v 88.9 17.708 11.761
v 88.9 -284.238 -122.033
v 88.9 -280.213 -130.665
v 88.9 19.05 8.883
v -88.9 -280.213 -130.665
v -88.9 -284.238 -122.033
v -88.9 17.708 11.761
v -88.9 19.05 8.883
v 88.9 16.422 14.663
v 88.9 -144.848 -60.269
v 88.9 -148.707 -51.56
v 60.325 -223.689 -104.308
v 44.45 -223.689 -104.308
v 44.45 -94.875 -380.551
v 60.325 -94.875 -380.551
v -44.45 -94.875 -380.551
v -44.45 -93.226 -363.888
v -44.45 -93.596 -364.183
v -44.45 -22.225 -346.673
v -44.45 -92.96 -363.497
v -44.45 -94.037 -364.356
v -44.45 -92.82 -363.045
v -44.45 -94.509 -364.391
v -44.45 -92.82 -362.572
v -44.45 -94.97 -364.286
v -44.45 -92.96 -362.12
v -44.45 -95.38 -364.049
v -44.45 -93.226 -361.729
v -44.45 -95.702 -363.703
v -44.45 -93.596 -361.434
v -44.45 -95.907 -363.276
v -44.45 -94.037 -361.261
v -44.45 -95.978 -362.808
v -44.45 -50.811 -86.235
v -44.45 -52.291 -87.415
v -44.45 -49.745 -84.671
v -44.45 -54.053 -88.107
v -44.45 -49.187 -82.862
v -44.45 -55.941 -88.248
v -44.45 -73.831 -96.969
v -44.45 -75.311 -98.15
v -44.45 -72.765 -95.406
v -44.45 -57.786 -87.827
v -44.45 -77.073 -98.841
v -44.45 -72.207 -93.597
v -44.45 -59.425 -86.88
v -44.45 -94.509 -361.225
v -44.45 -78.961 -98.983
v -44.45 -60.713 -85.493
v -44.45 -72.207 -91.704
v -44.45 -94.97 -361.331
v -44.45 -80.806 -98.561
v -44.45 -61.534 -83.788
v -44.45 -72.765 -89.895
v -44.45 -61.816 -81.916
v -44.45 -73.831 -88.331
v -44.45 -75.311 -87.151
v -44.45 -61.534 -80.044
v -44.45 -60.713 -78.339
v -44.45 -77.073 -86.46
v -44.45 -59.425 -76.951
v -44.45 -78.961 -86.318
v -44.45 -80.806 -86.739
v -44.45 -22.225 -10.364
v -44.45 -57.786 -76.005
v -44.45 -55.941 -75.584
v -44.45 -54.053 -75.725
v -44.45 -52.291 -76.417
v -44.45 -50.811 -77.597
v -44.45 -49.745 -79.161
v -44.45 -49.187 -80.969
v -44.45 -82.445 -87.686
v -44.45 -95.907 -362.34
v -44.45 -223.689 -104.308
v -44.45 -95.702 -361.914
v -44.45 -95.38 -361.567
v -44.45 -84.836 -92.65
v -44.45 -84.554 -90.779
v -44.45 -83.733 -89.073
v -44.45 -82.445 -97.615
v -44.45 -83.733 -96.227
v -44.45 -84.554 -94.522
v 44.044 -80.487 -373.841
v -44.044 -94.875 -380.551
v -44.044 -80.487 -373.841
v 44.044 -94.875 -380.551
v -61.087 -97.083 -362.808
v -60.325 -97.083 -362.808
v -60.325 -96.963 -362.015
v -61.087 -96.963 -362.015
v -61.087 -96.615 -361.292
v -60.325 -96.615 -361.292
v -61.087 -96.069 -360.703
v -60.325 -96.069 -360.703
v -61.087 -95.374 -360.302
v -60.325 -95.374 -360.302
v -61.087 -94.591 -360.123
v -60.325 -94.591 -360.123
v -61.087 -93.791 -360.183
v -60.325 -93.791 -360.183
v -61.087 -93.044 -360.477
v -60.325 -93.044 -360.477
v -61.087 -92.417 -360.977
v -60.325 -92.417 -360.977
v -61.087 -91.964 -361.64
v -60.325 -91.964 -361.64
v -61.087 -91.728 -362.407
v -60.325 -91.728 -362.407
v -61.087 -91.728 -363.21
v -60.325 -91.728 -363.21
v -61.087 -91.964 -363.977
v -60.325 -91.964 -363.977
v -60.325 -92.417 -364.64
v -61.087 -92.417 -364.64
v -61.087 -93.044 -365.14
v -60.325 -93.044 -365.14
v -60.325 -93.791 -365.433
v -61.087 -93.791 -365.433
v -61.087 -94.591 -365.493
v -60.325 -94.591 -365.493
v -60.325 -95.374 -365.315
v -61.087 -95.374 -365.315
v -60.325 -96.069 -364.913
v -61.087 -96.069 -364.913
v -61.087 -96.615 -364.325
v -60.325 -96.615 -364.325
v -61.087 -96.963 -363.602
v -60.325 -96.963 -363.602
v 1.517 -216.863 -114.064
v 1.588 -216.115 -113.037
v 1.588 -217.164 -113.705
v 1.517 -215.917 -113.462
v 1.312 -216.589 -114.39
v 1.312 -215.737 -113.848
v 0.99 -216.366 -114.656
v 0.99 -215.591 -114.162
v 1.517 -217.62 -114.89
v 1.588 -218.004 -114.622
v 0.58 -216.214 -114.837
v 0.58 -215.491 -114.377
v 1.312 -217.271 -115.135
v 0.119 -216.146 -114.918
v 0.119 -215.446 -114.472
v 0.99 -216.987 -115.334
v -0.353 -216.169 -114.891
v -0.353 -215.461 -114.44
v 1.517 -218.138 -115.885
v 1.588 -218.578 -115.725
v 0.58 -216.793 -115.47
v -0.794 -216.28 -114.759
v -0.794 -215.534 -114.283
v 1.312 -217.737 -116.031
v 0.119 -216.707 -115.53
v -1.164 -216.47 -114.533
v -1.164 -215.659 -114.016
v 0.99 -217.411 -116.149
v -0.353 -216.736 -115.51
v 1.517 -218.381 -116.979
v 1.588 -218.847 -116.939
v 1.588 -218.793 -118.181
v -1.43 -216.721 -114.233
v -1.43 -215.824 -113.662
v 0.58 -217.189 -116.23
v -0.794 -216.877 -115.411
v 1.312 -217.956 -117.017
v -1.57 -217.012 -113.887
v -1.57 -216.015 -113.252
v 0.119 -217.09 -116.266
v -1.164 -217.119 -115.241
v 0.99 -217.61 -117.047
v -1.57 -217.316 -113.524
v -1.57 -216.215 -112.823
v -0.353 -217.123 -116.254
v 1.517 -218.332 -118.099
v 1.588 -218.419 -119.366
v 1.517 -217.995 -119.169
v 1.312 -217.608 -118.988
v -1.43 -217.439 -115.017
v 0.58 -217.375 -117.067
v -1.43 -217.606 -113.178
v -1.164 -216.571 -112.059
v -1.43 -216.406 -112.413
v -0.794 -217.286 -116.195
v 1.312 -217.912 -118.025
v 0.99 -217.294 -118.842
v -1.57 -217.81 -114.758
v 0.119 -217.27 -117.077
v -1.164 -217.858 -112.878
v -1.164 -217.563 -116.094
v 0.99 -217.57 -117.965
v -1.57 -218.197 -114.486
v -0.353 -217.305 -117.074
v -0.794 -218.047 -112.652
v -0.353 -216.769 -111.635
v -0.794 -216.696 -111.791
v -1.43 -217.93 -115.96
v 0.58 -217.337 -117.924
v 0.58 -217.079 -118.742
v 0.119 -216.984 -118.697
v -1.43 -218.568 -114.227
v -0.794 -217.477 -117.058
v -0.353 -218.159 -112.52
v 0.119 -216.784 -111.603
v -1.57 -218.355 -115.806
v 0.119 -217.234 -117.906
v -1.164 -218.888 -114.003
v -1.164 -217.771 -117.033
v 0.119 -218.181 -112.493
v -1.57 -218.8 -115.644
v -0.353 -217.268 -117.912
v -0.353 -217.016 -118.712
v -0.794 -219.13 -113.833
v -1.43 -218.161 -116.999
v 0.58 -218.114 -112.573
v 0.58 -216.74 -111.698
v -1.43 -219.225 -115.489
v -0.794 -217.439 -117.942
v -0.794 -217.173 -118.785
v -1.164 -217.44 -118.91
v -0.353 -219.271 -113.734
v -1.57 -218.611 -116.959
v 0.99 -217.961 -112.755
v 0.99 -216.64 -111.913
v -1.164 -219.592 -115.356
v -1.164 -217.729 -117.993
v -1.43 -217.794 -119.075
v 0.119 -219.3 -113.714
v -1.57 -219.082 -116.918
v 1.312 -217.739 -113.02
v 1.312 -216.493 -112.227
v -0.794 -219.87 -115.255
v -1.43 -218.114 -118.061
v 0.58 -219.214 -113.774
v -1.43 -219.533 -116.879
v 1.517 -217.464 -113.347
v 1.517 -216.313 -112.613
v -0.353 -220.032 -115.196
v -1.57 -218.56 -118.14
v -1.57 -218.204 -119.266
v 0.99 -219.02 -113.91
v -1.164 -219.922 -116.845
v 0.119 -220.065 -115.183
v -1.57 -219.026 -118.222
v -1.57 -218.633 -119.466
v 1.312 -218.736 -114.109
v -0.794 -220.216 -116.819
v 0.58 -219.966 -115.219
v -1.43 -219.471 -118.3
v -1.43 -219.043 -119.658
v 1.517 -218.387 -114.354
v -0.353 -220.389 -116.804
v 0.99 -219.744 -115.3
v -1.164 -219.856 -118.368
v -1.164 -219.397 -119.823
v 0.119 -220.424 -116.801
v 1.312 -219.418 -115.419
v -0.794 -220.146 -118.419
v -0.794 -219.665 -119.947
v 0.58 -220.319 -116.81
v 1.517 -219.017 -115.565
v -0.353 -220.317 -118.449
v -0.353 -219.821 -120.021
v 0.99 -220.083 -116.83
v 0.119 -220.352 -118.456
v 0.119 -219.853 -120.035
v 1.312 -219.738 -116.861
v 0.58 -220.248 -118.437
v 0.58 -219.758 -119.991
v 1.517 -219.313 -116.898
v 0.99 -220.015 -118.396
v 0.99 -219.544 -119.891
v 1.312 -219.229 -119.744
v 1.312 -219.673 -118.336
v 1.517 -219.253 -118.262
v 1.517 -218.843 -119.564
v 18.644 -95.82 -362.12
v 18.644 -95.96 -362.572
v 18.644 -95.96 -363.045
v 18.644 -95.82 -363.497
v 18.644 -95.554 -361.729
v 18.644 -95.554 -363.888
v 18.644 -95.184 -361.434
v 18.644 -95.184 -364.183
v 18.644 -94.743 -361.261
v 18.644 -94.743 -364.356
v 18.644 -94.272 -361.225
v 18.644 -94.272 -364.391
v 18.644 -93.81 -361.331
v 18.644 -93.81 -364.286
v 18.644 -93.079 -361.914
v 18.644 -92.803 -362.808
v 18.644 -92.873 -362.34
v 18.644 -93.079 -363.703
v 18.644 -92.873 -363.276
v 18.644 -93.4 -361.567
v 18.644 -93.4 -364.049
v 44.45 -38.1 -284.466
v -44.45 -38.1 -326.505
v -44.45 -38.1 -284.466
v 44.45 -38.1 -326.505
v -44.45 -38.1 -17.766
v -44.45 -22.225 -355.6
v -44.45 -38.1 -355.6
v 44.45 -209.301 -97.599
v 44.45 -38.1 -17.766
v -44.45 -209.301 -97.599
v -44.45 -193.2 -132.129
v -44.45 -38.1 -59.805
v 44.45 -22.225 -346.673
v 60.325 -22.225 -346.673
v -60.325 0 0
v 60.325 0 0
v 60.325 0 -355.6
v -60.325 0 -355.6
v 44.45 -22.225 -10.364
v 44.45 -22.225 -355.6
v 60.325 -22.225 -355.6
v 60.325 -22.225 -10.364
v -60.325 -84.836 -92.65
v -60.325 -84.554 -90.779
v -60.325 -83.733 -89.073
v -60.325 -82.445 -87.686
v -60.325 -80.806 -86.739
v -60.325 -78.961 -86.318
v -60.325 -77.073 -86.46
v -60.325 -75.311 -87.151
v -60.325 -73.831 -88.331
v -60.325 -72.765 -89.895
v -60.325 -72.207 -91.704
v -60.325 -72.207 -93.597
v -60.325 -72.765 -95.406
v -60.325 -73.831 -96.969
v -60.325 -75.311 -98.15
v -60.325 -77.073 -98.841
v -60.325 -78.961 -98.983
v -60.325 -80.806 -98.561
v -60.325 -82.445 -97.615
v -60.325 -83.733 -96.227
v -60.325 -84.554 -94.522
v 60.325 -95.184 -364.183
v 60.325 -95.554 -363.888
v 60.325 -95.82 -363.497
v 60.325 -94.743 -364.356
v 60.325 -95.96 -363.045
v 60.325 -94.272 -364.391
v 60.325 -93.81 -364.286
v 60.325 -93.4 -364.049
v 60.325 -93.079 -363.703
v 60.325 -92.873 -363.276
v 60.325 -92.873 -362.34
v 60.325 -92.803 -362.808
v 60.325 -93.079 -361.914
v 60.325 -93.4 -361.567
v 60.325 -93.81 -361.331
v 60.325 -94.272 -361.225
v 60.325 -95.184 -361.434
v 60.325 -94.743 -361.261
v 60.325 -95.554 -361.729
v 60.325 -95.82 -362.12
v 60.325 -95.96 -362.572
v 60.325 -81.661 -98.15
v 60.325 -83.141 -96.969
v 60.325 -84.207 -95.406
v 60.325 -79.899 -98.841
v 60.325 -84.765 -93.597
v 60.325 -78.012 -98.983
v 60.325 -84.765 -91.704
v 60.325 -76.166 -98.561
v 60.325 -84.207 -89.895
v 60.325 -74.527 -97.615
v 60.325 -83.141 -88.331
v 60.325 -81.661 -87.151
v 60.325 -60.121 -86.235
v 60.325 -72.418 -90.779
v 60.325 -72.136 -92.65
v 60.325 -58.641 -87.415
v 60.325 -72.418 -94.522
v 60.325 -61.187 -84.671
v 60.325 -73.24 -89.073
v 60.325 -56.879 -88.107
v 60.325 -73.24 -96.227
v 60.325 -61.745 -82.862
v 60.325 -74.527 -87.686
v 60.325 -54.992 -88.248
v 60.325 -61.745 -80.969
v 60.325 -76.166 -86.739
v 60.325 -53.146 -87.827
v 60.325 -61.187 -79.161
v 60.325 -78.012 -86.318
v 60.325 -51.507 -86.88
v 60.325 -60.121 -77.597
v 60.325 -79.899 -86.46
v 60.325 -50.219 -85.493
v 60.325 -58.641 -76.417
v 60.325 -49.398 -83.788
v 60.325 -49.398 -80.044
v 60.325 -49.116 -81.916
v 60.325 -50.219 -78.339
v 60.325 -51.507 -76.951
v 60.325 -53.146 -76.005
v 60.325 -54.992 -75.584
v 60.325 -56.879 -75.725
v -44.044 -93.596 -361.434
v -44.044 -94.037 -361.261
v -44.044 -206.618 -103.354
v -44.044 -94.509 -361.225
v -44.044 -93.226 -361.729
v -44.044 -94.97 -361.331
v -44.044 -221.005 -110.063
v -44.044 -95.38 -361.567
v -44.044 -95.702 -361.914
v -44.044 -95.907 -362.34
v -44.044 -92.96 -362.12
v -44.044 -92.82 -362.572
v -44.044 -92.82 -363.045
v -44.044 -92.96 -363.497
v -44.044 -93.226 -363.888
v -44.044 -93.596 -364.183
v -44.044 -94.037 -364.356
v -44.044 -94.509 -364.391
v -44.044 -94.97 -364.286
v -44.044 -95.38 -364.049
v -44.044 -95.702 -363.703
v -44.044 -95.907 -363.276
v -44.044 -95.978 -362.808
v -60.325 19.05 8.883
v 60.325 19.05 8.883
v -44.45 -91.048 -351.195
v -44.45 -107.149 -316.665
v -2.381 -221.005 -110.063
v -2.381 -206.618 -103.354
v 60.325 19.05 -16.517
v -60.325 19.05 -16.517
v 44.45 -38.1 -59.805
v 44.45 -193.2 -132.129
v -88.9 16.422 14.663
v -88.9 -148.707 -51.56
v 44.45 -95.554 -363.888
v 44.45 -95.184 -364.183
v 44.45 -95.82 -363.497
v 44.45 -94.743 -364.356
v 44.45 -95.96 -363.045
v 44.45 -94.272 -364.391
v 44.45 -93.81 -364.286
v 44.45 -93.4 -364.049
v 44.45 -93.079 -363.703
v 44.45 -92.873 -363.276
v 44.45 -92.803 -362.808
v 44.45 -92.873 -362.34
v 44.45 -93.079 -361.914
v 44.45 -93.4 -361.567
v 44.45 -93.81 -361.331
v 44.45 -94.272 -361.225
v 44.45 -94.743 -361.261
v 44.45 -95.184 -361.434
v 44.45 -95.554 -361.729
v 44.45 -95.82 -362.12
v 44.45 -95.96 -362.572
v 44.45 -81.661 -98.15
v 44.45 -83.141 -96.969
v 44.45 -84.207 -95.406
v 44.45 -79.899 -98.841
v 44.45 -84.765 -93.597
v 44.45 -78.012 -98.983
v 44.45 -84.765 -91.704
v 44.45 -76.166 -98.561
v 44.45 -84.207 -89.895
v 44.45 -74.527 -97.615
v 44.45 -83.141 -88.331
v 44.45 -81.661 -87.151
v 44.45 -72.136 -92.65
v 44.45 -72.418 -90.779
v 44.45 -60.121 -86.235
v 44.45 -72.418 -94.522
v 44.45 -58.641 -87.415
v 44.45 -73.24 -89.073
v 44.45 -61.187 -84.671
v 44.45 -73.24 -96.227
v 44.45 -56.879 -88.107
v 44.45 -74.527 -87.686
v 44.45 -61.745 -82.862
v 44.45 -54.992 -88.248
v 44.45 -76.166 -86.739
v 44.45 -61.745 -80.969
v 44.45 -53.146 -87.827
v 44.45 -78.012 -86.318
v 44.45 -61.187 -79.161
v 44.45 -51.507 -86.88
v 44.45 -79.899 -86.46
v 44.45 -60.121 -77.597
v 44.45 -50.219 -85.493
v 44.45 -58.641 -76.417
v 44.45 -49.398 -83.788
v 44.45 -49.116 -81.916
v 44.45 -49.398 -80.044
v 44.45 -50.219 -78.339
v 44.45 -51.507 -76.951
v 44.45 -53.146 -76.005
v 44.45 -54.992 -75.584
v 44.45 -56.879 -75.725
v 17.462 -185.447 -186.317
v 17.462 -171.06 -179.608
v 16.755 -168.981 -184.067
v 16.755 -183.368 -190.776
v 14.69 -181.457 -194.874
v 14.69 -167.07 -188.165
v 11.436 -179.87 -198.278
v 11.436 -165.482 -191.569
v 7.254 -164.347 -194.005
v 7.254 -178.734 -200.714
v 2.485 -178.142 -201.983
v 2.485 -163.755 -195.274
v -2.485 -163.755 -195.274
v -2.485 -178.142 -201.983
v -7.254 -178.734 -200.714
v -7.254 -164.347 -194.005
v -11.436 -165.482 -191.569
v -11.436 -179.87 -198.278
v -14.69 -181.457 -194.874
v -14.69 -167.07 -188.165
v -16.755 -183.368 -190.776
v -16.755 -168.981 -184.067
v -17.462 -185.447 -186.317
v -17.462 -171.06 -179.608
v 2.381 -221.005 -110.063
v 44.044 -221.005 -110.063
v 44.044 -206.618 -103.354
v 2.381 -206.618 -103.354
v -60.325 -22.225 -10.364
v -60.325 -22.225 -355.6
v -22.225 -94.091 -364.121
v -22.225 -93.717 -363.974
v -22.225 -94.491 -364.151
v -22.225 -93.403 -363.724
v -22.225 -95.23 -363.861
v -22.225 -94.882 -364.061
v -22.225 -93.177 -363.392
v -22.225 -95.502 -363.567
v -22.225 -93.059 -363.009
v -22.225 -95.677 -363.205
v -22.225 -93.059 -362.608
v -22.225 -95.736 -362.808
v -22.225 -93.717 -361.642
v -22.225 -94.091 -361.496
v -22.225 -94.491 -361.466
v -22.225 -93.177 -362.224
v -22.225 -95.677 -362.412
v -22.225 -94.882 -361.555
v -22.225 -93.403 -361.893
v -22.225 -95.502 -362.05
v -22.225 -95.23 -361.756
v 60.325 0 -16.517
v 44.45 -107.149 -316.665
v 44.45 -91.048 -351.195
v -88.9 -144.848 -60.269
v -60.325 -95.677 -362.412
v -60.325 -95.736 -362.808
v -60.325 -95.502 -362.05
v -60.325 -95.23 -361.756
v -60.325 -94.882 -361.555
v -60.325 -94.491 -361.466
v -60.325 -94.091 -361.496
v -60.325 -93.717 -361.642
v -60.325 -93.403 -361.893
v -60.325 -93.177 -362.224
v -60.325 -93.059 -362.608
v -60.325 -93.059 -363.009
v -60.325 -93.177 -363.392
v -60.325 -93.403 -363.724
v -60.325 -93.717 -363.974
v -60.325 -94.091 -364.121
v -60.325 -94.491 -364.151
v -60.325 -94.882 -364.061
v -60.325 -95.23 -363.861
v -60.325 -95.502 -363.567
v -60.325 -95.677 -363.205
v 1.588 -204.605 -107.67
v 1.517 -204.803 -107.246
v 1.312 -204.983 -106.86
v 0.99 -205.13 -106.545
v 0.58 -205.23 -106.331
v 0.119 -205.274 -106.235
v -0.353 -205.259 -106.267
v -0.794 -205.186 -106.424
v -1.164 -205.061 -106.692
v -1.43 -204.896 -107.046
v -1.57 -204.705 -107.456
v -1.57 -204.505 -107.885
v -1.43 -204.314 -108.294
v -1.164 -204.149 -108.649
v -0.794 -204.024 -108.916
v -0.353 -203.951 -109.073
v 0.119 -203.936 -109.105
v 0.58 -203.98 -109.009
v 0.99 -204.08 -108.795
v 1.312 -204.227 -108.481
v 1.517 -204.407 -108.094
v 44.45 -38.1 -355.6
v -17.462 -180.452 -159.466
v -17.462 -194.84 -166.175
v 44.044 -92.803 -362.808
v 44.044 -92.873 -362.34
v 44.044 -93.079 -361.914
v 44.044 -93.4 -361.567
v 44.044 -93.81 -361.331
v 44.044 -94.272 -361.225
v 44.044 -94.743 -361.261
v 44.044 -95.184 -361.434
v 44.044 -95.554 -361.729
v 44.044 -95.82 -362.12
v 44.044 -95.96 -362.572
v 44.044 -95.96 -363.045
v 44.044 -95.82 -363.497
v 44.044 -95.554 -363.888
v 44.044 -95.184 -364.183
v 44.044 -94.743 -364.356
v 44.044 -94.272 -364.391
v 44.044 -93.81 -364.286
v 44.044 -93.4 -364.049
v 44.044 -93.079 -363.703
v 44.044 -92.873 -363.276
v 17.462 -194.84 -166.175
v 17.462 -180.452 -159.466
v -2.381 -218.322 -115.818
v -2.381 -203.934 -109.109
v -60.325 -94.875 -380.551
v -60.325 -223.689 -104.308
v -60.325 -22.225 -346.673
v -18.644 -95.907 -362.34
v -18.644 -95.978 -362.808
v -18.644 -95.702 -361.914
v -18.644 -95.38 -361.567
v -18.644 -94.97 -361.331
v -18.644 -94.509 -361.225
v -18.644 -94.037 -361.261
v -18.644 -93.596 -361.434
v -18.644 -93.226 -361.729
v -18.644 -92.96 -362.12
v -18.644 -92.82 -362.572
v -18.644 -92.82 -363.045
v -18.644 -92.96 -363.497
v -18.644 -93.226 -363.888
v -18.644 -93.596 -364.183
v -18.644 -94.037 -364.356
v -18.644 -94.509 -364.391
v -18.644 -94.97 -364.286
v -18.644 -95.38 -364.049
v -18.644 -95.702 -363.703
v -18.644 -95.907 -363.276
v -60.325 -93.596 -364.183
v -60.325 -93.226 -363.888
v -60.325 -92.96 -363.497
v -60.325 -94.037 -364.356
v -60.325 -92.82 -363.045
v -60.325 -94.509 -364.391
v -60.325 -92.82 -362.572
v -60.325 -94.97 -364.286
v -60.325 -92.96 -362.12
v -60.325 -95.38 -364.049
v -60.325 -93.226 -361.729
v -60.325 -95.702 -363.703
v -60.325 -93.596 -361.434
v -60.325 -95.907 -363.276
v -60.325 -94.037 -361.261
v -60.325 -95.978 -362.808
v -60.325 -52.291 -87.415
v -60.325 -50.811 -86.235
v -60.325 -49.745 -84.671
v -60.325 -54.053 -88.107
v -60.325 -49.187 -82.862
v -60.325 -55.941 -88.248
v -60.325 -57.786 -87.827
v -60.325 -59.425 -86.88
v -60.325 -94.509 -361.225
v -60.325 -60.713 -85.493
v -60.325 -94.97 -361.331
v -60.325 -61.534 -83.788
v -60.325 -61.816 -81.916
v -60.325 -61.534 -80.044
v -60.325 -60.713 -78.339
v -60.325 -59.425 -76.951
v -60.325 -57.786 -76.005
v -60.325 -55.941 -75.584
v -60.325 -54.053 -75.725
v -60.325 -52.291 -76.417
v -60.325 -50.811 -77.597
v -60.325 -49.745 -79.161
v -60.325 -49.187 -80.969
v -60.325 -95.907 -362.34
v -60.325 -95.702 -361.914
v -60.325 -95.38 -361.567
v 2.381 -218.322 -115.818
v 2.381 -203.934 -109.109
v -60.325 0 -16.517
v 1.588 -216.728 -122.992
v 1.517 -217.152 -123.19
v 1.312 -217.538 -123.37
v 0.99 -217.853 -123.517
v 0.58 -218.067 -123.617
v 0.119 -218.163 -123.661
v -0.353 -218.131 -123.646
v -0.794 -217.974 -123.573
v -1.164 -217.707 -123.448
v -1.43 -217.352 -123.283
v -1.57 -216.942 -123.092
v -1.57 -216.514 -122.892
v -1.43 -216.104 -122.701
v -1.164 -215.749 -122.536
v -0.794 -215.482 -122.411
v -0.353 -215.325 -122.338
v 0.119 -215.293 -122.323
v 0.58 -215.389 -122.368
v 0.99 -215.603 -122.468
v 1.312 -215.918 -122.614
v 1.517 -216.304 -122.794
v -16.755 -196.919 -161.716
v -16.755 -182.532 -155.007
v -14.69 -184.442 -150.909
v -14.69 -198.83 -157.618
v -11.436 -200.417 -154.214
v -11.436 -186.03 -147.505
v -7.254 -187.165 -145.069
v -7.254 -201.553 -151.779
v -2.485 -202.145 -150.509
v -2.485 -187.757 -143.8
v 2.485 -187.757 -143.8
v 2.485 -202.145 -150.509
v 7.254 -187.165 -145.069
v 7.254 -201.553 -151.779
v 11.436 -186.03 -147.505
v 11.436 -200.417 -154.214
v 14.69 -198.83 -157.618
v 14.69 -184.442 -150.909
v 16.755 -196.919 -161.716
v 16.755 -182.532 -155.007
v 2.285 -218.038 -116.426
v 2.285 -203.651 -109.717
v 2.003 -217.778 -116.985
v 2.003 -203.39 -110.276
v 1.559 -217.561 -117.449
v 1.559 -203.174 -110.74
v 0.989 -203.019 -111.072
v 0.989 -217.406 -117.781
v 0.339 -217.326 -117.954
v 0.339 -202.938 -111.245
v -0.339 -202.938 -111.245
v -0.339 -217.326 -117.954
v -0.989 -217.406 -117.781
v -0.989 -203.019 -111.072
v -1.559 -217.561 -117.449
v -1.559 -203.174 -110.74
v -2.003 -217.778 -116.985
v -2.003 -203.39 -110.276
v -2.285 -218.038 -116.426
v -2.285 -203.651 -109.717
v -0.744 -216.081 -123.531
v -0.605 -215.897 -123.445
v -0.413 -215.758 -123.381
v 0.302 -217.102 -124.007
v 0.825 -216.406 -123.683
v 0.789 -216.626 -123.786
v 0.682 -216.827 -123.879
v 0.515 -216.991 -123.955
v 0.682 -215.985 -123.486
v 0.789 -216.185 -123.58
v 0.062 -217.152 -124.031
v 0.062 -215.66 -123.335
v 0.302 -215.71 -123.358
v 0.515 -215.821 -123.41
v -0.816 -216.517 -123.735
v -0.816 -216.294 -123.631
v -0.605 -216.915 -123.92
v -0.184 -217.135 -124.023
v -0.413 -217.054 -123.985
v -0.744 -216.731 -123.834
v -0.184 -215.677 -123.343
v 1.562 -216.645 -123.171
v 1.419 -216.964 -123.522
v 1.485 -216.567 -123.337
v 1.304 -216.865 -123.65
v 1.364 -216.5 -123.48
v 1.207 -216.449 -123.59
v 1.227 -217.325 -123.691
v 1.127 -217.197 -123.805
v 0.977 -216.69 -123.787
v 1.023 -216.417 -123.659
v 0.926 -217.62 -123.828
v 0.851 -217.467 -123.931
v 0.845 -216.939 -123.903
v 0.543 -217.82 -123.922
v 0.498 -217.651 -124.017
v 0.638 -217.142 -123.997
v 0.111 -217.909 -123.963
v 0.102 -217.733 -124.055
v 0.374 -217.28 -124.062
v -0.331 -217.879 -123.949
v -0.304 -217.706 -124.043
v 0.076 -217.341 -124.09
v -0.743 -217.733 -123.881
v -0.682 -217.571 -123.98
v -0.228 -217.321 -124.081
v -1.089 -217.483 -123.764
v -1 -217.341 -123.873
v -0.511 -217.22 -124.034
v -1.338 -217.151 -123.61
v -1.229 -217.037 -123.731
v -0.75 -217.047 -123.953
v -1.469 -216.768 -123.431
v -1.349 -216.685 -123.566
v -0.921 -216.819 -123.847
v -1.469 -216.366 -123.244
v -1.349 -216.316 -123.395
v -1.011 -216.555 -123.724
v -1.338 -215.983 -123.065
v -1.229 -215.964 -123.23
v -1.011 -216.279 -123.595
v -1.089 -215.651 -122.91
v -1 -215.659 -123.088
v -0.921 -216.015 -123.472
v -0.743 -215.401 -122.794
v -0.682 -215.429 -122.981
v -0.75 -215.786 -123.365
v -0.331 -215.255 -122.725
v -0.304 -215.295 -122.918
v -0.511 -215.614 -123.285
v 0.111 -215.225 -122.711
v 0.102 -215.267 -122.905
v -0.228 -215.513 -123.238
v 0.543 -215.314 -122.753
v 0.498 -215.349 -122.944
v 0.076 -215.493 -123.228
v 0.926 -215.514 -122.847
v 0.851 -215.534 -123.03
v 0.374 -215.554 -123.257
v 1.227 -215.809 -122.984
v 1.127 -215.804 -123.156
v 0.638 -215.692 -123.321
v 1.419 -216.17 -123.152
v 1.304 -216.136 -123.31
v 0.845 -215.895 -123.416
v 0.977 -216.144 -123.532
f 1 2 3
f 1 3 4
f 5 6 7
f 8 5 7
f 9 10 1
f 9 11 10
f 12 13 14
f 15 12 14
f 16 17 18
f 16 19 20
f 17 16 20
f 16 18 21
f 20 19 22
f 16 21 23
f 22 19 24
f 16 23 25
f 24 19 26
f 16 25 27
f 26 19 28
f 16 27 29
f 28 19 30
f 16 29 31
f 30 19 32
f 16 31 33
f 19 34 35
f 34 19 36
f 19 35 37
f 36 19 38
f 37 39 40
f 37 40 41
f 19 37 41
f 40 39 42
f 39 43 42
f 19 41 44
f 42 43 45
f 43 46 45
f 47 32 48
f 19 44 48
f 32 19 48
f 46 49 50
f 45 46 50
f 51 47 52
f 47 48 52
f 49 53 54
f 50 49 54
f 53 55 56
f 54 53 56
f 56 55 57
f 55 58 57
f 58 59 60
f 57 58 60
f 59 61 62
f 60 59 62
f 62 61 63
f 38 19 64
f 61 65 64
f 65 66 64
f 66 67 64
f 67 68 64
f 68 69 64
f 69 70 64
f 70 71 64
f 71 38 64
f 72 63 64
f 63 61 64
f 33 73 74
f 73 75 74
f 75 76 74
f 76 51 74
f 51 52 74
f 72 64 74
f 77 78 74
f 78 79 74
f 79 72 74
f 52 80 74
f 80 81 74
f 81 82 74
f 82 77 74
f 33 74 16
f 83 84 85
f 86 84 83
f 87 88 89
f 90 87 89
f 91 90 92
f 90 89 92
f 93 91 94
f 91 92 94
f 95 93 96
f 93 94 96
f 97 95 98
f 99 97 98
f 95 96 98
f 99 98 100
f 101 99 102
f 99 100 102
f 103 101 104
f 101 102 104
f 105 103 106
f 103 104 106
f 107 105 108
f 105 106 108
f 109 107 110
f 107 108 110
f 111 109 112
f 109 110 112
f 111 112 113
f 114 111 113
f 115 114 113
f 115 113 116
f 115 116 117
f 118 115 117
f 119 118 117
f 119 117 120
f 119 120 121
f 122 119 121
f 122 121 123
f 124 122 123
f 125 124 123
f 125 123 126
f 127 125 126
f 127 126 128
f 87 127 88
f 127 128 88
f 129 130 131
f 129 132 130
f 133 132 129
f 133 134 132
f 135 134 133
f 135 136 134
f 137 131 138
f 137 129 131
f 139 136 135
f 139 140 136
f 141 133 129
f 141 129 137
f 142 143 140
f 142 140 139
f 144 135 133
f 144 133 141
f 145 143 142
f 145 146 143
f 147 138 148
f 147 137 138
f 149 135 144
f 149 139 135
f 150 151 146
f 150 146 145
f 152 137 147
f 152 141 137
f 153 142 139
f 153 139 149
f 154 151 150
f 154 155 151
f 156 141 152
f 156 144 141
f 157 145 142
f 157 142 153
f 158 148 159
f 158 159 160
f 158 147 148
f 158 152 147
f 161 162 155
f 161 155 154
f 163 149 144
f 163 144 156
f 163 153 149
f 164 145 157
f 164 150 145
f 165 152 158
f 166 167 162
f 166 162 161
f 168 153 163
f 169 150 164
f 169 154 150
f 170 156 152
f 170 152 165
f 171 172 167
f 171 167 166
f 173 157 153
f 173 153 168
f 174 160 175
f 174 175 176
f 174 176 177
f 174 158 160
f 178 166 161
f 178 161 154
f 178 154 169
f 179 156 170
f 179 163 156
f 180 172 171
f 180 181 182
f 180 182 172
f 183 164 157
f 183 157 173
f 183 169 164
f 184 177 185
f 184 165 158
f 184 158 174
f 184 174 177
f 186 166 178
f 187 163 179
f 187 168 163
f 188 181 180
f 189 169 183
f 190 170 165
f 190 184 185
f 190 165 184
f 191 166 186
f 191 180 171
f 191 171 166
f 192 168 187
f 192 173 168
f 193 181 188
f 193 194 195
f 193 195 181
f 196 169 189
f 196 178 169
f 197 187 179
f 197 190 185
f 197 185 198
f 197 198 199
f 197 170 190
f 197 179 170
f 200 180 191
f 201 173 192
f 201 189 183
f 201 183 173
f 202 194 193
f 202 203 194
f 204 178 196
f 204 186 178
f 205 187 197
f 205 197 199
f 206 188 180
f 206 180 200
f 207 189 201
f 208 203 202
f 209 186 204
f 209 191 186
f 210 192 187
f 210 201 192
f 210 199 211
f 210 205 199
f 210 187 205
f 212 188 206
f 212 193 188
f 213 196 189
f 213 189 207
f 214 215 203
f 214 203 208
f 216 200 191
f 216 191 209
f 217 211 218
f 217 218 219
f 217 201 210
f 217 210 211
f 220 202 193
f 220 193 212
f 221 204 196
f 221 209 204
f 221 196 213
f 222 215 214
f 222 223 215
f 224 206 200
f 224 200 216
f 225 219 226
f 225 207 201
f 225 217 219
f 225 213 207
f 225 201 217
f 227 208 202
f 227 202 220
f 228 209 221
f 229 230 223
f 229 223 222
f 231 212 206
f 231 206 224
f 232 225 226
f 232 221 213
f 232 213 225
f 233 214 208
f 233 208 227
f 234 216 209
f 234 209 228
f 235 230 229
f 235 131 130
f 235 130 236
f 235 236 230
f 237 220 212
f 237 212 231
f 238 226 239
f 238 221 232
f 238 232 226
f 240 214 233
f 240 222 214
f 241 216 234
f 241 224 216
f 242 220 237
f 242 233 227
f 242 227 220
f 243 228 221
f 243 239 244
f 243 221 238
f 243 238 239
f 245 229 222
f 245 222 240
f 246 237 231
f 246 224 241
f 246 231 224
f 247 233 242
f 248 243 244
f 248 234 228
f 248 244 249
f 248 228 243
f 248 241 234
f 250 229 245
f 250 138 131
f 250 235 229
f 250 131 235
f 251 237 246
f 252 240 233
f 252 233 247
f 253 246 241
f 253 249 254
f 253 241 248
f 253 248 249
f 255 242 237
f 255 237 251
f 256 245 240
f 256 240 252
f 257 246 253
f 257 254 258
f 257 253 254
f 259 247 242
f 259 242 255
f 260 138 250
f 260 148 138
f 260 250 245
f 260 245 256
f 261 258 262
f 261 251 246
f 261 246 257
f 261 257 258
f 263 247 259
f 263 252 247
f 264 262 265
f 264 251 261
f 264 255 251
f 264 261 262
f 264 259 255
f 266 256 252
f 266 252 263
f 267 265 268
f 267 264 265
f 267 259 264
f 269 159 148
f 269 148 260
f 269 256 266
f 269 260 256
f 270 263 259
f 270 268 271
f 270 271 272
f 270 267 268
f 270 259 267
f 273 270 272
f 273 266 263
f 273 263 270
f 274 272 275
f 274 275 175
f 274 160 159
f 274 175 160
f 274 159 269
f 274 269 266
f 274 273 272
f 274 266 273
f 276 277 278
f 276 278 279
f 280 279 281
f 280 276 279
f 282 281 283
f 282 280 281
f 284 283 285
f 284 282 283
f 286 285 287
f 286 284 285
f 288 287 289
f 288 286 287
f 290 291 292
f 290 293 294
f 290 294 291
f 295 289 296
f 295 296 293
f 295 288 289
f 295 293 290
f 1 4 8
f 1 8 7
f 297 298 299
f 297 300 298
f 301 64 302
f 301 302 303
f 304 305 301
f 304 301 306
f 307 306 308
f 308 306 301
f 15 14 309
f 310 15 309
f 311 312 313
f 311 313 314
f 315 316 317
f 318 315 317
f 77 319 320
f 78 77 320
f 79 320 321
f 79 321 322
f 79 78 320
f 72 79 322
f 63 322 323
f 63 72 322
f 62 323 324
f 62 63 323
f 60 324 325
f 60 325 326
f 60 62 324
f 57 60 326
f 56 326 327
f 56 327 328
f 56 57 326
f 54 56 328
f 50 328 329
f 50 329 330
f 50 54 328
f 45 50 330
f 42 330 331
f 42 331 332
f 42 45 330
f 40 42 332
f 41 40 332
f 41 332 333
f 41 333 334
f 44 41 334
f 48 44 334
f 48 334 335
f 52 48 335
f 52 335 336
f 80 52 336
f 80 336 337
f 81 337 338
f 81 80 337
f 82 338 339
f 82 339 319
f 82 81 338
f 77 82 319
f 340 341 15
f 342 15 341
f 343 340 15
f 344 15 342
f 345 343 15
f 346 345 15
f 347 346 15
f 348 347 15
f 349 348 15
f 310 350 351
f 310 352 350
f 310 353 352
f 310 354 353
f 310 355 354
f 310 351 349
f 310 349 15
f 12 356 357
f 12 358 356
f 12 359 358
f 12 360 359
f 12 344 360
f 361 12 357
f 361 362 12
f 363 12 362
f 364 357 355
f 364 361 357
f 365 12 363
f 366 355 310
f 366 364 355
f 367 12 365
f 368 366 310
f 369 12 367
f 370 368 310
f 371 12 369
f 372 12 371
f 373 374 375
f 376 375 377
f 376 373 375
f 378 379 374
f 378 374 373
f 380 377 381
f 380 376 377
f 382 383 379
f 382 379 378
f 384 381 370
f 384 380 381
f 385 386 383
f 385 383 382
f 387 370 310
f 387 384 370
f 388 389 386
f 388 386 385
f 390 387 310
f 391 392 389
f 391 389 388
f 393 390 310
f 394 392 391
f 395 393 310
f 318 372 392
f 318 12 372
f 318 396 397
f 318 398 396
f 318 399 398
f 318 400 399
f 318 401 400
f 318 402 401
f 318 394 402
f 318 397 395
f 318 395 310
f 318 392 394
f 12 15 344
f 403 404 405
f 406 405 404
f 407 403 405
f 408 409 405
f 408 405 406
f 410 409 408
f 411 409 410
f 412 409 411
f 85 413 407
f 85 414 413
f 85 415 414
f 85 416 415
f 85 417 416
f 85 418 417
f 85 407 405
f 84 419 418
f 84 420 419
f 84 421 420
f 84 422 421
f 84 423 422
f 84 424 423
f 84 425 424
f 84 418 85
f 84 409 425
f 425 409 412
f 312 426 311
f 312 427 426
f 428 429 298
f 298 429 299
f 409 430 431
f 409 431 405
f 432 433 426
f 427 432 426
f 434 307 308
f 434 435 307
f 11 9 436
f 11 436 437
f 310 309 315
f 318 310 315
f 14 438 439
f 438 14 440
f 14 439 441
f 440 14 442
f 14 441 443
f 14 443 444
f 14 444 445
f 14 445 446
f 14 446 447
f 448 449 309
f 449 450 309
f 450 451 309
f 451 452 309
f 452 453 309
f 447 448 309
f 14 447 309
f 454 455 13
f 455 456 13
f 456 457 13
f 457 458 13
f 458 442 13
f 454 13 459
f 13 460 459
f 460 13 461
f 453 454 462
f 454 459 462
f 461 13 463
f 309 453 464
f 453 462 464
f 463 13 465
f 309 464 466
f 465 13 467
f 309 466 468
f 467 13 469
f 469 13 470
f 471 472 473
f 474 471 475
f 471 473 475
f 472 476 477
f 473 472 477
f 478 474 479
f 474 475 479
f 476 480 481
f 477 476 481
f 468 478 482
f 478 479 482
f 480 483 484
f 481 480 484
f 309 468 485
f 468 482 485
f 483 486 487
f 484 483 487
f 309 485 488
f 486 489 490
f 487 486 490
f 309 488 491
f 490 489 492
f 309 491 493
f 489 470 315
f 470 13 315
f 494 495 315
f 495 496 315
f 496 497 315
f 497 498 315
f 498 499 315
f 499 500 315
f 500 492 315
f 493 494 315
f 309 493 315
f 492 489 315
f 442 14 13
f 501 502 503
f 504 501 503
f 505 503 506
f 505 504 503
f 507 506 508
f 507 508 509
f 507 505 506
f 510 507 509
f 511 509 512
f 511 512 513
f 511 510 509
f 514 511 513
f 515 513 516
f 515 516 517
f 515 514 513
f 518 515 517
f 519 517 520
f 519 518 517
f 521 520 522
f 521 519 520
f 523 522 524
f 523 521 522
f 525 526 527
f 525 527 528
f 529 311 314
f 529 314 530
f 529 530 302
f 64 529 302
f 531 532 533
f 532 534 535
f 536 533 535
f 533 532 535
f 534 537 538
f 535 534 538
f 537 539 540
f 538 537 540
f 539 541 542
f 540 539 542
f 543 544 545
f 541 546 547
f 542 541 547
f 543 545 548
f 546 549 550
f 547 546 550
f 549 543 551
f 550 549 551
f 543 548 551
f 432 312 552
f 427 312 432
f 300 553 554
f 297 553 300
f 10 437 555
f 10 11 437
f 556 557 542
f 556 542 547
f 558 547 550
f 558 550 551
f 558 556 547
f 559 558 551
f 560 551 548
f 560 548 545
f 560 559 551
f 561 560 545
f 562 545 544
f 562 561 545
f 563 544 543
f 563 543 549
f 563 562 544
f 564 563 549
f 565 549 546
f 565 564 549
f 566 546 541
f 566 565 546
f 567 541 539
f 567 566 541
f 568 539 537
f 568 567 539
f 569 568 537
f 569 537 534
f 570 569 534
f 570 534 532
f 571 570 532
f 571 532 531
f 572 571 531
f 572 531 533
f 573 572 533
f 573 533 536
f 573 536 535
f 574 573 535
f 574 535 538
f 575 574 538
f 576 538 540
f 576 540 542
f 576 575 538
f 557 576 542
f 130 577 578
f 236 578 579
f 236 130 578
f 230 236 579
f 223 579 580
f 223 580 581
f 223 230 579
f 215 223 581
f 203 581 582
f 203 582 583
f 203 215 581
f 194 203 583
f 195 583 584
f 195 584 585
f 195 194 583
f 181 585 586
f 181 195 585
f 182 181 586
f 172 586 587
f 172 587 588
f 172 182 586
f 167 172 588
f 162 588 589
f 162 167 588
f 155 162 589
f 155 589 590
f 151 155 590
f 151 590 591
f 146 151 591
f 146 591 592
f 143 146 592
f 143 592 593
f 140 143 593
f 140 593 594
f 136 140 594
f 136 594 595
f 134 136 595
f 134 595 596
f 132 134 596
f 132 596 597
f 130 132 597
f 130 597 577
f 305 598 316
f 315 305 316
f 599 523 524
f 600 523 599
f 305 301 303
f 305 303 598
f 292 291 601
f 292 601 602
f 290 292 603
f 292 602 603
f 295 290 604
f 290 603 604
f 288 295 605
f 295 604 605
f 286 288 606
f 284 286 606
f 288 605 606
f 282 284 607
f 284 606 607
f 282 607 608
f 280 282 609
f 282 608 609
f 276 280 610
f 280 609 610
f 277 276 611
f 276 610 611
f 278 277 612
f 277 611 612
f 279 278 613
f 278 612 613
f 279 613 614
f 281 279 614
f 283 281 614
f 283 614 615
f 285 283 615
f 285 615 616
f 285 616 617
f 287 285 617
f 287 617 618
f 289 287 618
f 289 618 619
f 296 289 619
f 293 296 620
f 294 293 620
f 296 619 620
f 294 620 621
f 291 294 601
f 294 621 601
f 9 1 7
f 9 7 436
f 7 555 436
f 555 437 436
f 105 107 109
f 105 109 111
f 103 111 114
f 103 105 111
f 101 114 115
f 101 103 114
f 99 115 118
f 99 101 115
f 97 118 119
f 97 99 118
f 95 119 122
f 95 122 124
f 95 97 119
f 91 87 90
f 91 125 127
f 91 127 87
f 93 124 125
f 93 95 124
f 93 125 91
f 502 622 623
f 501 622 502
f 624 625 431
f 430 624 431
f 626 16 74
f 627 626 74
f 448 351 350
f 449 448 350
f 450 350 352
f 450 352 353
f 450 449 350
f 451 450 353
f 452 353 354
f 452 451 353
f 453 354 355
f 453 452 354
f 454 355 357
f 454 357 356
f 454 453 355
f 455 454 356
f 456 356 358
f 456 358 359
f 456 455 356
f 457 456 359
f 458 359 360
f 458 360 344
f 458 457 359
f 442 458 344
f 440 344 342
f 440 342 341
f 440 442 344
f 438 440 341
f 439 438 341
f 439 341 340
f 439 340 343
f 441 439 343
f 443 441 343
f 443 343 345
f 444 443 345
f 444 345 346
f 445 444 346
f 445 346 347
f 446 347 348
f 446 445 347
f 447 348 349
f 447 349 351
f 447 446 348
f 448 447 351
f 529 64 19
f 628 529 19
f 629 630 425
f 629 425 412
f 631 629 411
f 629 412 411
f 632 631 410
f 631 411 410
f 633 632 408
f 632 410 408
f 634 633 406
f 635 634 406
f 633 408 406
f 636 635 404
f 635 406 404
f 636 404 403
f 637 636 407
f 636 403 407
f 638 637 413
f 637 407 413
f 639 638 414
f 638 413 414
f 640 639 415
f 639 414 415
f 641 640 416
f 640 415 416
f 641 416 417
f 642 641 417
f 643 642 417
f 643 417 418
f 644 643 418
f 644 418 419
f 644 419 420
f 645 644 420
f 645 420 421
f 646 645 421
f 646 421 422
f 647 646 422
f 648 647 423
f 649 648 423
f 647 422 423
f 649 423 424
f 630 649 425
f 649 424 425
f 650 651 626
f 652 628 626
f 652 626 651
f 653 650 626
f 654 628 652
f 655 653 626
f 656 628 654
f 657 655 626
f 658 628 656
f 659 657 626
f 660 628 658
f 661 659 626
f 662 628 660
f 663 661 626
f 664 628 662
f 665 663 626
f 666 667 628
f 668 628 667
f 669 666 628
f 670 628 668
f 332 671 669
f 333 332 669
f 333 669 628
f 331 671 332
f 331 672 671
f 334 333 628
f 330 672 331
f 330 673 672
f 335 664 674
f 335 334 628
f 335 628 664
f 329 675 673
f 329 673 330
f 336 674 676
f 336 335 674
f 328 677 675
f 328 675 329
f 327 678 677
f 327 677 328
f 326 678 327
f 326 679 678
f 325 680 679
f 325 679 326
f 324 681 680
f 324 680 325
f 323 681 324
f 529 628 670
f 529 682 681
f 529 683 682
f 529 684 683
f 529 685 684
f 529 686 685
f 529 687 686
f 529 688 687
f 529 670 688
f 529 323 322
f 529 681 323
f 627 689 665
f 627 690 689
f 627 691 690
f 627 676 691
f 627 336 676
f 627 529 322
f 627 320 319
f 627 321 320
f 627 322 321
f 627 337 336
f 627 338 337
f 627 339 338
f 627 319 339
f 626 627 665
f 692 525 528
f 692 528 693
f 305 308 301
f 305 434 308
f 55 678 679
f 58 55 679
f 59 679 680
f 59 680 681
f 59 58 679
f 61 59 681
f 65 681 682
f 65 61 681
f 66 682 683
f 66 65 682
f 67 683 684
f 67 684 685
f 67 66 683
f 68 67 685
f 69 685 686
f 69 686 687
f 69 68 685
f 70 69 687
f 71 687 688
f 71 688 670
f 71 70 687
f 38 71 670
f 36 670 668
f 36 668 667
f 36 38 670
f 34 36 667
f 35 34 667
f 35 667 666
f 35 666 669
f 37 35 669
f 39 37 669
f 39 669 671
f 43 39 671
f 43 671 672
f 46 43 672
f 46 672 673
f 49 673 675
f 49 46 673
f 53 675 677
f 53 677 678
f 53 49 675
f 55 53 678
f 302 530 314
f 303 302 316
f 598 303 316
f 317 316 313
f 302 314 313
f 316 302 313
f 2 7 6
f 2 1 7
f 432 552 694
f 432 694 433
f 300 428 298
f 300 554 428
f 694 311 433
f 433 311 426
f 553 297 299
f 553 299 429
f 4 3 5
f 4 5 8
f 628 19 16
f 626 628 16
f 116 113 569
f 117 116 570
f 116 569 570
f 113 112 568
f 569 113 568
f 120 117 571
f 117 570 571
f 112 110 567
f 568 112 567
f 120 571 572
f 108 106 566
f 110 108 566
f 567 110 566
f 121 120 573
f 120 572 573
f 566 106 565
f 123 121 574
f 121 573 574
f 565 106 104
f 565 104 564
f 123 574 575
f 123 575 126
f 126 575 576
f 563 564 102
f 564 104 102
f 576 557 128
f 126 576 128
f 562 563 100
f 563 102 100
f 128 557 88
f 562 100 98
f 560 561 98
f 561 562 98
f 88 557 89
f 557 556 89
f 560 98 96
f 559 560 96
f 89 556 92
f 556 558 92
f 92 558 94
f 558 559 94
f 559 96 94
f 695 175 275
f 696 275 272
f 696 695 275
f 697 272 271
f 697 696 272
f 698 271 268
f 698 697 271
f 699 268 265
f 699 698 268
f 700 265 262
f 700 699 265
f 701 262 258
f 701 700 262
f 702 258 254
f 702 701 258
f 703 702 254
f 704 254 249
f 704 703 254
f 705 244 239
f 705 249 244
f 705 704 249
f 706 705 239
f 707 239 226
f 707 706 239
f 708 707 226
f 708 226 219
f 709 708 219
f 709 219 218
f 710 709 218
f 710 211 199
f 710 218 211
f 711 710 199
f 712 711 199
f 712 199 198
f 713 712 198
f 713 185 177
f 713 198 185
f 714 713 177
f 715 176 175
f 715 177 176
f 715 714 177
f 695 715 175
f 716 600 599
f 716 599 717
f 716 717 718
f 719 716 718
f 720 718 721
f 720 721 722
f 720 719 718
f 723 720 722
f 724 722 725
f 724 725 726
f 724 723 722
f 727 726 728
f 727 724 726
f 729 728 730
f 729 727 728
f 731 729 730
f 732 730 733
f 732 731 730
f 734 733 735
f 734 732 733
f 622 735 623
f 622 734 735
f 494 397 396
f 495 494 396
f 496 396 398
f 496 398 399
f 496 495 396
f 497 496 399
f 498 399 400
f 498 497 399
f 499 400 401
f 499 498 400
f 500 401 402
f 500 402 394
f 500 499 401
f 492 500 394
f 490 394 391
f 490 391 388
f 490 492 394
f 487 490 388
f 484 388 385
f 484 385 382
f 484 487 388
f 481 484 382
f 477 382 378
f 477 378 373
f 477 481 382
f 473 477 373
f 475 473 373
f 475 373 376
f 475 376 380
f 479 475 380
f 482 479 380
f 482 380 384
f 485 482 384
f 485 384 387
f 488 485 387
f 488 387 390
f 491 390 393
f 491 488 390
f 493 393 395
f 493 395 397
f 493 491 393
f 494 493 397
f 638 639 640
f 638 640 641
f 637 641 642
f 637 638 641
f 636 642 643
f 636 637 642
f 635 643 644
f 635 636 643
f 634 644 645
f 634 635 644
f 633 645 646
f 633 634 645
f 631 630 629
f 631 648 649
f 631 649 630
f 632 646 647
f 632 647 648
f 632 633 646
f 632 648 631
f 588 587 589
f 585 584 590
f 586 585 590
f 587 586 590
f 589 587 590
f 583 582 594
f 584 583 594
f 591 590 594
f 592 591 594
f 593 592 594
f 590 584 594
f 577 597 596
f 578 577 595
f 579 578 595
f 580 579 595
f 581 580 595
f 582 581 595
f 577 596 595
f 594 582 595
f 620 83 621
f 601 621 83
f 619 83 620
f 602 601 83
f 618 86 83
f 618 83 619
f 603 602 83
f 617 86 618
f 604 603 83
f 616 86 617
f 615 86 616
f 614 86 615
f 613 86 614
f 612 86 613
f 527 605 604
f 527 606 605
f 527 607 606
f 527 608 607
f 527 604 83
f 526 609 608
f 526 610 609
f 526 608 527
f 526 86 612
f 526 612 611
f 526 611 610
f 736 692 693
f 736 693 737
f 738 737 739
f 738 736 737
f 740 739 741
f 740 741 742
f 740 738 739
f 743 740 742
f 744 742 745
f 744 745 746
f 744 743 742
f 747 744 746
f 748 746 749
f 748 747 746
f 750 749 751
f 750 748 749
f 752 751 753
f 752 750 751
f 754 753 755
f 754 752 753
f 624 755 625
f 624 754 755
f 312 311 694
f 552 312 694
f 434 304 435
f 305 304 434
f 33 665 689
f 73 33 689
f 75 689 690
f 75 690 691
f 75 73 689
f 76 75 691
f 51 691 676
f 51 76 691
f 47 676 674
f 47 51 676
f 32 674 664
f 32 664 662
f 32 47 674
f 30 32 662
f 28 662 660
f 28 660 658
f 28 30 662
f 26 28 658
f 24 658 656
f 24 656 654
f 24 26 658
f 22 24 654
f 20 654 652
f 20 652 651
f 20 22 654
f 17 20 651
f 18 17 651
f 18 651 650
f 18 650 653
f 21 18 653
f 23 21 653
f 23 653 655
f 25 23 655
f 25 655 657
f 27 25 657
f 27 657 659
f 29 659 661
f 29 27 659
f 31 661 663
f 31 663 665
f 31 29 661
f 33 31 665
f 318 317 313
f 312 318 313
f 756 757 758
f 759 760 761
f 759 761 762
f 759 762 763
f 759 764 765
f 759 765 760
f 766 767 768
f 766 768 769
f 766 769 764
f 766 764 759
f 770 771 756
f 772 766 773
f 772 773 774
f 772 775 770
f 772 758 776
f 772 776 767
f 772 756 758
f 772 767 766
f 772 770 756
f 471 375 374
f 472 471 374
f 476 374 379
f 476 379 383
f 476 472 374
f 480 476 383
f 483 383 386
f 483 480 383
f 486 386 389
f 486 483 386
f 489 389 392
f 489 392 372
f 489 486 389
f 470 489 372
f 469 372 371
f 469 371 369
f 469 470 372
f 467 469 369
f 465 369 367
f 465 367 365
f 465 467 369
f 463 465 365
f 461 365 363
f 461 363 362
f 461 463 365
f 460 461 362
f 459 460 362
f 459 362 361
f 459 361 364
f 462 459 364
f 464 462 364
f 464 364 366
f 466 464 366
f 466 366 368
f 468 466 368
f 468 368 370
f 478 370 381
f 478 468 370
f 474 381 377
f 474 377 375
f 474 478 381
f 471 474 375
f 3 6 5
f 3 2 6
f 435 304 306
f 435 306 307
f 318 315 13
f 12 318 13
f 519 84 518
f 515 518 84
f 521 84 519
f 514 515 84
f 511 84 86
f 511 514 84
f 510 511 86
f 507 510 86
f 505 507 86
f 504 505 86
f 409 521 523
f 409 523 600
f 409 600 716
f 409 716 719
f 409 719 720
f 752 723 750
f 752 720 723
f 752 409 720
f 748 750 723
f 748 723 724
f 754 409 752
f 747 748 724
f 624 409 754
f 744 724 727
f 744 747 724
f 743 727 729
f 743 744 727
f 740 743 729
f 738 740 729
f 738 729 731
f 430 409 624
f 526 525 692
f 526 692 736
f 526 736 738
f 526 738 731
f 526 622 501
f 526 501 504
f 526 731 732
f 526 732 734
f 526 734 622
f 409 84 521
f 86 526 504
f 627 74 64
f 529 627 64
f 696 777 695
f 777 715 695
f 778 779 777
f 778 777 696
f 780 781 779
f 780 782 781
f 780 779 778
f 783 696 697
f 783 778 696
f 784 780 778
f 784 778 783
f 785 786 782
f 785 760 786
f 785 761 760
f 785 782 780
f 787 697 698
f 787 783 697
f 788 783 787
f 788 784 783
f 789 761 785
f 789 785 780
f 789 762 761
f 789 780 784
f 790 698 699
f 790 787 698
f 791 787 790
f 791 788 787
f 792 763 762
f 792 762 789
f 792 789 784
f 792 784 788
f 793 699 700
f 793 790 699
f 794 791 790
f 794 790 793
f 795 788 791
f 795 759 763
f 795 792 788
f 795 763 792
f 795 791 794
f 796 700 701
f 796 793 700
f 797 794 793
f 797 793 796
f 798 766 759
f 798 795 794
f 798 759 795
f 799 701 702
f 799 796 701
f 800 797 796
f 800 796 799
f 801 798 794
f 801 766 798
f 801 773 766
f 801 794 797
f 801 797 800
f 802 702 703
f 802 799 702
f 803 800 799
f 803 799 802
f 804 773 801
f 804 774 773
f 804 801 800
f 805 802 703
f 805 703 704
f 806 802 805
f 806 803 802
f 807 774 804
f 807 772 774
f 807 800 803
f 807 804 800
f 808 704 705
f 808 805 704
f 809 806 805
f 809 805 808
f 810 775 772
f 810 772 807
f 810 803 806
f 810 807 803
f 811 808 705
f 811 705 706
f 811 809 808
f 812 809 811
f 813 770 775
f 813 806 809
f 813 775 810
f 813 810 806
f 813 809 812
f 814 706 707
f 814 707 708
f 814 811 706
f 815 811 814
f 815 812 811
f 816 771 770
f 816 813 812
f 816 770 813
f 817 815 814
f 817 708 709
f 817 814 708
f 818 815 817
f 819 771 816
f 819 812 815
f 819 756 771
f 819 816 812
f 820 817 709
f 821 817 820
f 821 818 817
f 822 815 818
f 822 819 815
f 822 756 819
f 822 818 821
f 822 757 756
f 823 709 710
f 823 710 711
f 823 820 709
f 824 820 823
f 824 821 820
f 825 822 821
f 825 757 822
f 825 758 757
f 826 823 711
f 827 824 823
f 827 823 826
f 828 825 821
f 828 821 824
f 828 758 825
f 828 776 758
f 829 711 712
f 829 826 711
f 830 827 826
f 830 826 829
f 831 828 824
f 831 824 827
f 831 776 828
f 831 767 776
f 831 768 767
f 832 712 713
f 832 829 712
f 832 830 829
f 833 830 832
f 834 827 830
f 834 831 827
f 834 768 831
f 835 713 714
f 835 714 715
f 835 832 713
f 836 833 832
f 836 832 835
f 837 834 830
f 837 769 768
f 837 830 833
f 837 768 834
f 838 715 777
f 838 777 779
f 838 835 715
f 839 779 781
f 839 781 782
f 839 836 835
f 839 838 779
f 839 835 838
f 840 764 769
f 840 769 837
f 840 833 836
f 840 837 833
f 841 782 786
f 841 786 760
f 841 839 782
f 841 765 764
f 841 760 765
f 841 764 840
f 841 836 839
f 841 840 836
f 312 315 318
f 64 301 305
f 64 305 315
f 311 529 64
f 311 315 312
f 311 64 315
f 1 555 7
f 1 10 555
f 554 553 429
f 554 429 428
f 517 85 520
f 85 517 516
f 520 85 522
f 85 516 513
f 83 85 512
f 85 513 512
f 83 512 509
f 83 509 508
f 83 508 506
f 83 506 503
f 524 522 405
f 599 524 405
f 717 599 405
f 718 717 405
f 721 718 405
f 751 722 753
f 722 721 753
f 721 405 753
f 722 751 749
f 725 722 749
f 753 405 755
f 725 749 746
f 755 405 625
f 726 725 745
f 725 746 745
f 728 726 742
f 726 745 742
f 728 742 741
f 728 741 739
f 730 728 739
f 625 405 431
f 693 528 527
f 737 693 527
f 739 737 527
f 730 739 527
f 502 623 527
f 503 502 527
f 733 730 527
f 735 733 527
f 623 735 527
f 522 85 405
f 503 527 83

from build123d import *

# Parameters (mm, degrees)
F1_DEPTH       = 355.6
F3_DEPTH       = 60.326
F3_DEPTH_BACK  = 60.326
F5_DEPTH       = 44.45
F7_DEPTH       = 44.45
F8_R           = 1.5875
F8_R_2         = 6.35
F9_DEPTH       = 15.875
F10_R          = 1.5875
F10_R_2        = 6.35
F11_DEPTH      = 15.875
F13_DEPTH      = 15.875
F14_R          = 1.5875
F15_DEPTH      = 25.4
F16_R          = 1.5875
F17_DEPTH      = 25.4
F19_DEPTH      = 88.9
F21_DEPTH      = 88.9
F21_DEPTH_BACK = 88.9
F23_DEPTH      = 60.325
F24_R          = 1.3462
F25_DEPTH      = 38.1
F26_R          = 2.6924
F27_DEPTH      = 0.762
F29_R          = 1.5875
F31_R          = 0.762


with BuildPart() as f1:
    # F0 (on Top) → F1 (new body)
    with BuildSketch(Plane.XY):
        Polygon((60.325, 0), (-60.325, 0), (-60.325, -22.225), (-44.45, -22.225), (-44.45, -38.1), (44.45, -38.1), (44.45, -22.225), (60.325, -22.225), align=None)
    extrude(amount=-F1_DEPTH)

    # F2 (on Right) → F3 (cut, two sides)
    with BuildSketch(Plane.YZ) as f3_sk:
        Polygon((-38.1, -17.7663217757), (0, 0), (-38.1, 0), align=None)
    extrude(amount=-F3_DEPTH, mode=Mode.SUBTRACT)
    extrude(f3_sk.sketch, amount=F3_DEPTH_BACK, mode=Mode.SUBTRACT)


with BuildPart() as f5:
    # F4 (on Right) → F5 (new body, symmetric)
    with BuildSketch(Plane.YZ):
        Polygon((-38.1, -59.8050204882), (-38.1, -17.7663217757), (-209.3013597097, -97.5988268949), (-193.1996039373, -132.129153581), align=None)
    extrude(amount=F5_DEPTH, both=True)


with BuildPart() as f7:
    # F6 (on Right) → F7 (new body, symmetric)
    with BuildSketch(Plane.YZ):
        Polygon((-38.1, -326.5050204882), (-38.1, -284.4663217757), (-107.1493332197, -316.6645546466), (-91.0475774474, -351.1948813327), align=None)
    extrude(amount=F7_DEPTH, both=True)


with BuildPart() as f9:
    # F8 (on face) → F9 (new body, through all)
    with BuildSketch(Plane(origin=(-44.45, 0, 0), x_dir=(0, -1, 0), z_dir=(-1, 0, 0))):
        Polygon((223.6889958289, -104.3078918), (22.225, -10.3636877025), (22.225, -346.6732774023), (94.8749496503, -380.5505052888), align=None)
        with Locations((94.3901964958, -362.808336717)):
            Circle(F8_R, mode=Mode.SUBTRACT)
        with Locations((55.4660997165, -81.9158653491)):
            Circle(F8_R_2, mode=Mode.SUBTRACT)
        with Locations((78.4863175073, -92.6503691973)):
            Circle(F8_R_2, mode=Mode.SUBTRACT)
    extrude(amount=F9_DEPTH)


with BuildPart() as f11:
    # F10 (on face) → F11 (new body, through all)
    with BuildSketch(Plane.YZ.offset(44.45)):
        Polygon((-22.225, -346.6732774023), (-22.225, -10.3636877025), (-223.6889958289, -104.3078918), (-94.8749496503, -380.5505052888), align=None)
        with Locations((-94.3901964958, -362.808336717)):
            Circle(F10_R, mode=Mode.SUBTRACT)
        with Locations((-78.4863175073, -92.6503691973)):
            Circle(F10_R_2, mode=Mode.SUBTRACT)
        with Locations((-55.4660997165, -81.9158653491)):
            Circle(F10_R_2, mode=Mode.SUBTRACT)
    extrude(amount=F11_DEPTH)


with BuildPart() as f13:
    # F12 (on face) → F13 (new body)
    with BuildSketch(Plane(origin=(0, -223.6889958289, -104.3078918), x_dir=(1, 0, 0), z_dir=(0, -0.906307787, -0.4226182617))):
        with BuildLine():
            Line((-2.38125, -6.35), (-44.0436, -6.35))
            Line((-44.0436, -6.35), (-44.0436, -304.8))
            Line((-44.0436, -304.8), (44.0436, -304.8))
            Line((44.0436, -304.8), (44.0436, -6.35))
            Line((44.0436, -6.35), (2.38125, -6.35))
            Line((2.38125, -6.35), (2.38125, -12.7))
            ThreePointArc((2.38125, -12.7), (0, -15.08125), (-2.38125, -12.7))
            Line((-2.38125, -12.7), (-2.38125, -6.35))
        make_face()
        with BuildLine():
            ThreePointArc((17.4625, -90.4875), (0, -107.95), (-17.4625, -90.4875))
            Line((-17.4625, -90.4875), (-17.4625, -68.2625))
            ThreePointArc((-17.4625, -68.2625), (0, -50.8), (17.4625, -68.2625))
            Line((17.4625, -68.2625), (17.4625, -90.4875))
        make_face(mode=Mode.SUBTRACT)
    extrude(amount=-F13_DEPTH)

    # F14 (on face) → F15 (cut)
    with BuildSketch(Plane(origin=(-44.0436, 0, 0), x_dir=(0, -1, 0), z_dir=(-1, 0, 0))):
        with Locations((94.3901964958, -362.808336717)):
            Circle(F14_R)
    extrude(amount=-F15_DEPTH, mode=Mode.SUBTRACT)

    # F16 (on face) → F17 (cut)
    with BuildSketch(Plane.YZ.offset(44.0436)):
        with Locations((-94.3901964958, -362.808336717)):
            Circle(F16_R)
    extrude(amount=-F17_DEPTH, mode=Mode.SUBTRACT)


with BuildPart() as f19:
    # F18 (on Right) → F19 (new body, symmetric)
    with BuildSketch(Plane.YZ):
        Polygon((-284.2382702226, -122.0328074674), (-280.2128312795, -130.6653891389), (19.05, 8.8831608879), (17.708187019, 11.7606881117), align=None)
    extrude(amount=F19_DEPTH, both=True)


with BuildPart() as f21:
    # F20 (on Right) → F21 (new body, two sides)
    with BuildSketch(Plane.YZ) as f21_sk:
        Polygon((-144.8483111348, -60.2686455516), (17.708187019, 11.7606881117), (16.4219489178, 14.6634827216), (-148.7070254382, -51.5602617219), align=None)
    extrude(amount=F21_DEPTH)
    extrude(f21_sk.sketch, amount=-F21_DEPTH_BACK)


with BuildPart() as f23:
    # F22 (on Right) → F23 (new body, symmetric)
    with BuildSketch(Plane.YZ):
        Polygon((19.05, 8.8831608879), (0, 0), (0, -16.5168391121), (19.05, -16.5168391121), align=None)
    extrude(amount=F23_DEPTH, both=True)


with BuildPart() as f25:
    # F24 (on face) → F25 (new body)
    with BuildSketch(Plane(origin=(-60.325, 0, 0), x_dir=(0, -1, 0), z_dir=(-1, 0, 0))):
        with Locations((94.3901964958, -362.808336717)):
            Circle(F24_R)
    extrude(amount=-F25_DEPTH)

    # F26 (on face) → F27 (join)
    with BuildSketch(Plane(origin=(-60.325, 0, 0), x_dir=(0, -1, 0), z_dir=(-1, 0, 0))):
        with Locations((94.3901964958, -362.808336717)):
            Circle(F26_R)
    extrude(amount=F27_DEPTH)


with BuildPart() as f30:
    # F30: sweep along a path in F28
    with BuildLine(Plane.YZ) as f30_path:
        Line((-204.6050142761, -107.6701721783), (-216.1151231714, -113.0374241024))
        ThreePointArc((-216.1151231714, -113.0374241024), (-218.5776898064, -115.7248440056), (-218.4186945357, -119.3664344097))
        Line((-218.4186945357, -119.3664344097), (-216.4059750641, -123.6827252455))
    # F29 (on face) → F30 (sweep)
    with BuildSketch(Plane(origin=(0, -209.3013597097, -97.5988268949), x_dir=(1, 0, 0), z_dir=(0, -0.906307787, -0.4226182617))):
        with Locations((0, -11.1125)):
            Circle(F29_R)
    sweep(path=f30_path.line)

    # F31
    f31_edges = [f30.edges().sort_by_distance(p)[0] for p in [
        (-1.5875, -216.405975, -123.682725),
    ]]
    fillet(f31_edges, radius=F31_R)


solid = Compound([f1.part, f5.part, f7.part, f9.part, f11.part, f13.part, f19.part, f21.part, f23.part, f25.part, f30.part])
